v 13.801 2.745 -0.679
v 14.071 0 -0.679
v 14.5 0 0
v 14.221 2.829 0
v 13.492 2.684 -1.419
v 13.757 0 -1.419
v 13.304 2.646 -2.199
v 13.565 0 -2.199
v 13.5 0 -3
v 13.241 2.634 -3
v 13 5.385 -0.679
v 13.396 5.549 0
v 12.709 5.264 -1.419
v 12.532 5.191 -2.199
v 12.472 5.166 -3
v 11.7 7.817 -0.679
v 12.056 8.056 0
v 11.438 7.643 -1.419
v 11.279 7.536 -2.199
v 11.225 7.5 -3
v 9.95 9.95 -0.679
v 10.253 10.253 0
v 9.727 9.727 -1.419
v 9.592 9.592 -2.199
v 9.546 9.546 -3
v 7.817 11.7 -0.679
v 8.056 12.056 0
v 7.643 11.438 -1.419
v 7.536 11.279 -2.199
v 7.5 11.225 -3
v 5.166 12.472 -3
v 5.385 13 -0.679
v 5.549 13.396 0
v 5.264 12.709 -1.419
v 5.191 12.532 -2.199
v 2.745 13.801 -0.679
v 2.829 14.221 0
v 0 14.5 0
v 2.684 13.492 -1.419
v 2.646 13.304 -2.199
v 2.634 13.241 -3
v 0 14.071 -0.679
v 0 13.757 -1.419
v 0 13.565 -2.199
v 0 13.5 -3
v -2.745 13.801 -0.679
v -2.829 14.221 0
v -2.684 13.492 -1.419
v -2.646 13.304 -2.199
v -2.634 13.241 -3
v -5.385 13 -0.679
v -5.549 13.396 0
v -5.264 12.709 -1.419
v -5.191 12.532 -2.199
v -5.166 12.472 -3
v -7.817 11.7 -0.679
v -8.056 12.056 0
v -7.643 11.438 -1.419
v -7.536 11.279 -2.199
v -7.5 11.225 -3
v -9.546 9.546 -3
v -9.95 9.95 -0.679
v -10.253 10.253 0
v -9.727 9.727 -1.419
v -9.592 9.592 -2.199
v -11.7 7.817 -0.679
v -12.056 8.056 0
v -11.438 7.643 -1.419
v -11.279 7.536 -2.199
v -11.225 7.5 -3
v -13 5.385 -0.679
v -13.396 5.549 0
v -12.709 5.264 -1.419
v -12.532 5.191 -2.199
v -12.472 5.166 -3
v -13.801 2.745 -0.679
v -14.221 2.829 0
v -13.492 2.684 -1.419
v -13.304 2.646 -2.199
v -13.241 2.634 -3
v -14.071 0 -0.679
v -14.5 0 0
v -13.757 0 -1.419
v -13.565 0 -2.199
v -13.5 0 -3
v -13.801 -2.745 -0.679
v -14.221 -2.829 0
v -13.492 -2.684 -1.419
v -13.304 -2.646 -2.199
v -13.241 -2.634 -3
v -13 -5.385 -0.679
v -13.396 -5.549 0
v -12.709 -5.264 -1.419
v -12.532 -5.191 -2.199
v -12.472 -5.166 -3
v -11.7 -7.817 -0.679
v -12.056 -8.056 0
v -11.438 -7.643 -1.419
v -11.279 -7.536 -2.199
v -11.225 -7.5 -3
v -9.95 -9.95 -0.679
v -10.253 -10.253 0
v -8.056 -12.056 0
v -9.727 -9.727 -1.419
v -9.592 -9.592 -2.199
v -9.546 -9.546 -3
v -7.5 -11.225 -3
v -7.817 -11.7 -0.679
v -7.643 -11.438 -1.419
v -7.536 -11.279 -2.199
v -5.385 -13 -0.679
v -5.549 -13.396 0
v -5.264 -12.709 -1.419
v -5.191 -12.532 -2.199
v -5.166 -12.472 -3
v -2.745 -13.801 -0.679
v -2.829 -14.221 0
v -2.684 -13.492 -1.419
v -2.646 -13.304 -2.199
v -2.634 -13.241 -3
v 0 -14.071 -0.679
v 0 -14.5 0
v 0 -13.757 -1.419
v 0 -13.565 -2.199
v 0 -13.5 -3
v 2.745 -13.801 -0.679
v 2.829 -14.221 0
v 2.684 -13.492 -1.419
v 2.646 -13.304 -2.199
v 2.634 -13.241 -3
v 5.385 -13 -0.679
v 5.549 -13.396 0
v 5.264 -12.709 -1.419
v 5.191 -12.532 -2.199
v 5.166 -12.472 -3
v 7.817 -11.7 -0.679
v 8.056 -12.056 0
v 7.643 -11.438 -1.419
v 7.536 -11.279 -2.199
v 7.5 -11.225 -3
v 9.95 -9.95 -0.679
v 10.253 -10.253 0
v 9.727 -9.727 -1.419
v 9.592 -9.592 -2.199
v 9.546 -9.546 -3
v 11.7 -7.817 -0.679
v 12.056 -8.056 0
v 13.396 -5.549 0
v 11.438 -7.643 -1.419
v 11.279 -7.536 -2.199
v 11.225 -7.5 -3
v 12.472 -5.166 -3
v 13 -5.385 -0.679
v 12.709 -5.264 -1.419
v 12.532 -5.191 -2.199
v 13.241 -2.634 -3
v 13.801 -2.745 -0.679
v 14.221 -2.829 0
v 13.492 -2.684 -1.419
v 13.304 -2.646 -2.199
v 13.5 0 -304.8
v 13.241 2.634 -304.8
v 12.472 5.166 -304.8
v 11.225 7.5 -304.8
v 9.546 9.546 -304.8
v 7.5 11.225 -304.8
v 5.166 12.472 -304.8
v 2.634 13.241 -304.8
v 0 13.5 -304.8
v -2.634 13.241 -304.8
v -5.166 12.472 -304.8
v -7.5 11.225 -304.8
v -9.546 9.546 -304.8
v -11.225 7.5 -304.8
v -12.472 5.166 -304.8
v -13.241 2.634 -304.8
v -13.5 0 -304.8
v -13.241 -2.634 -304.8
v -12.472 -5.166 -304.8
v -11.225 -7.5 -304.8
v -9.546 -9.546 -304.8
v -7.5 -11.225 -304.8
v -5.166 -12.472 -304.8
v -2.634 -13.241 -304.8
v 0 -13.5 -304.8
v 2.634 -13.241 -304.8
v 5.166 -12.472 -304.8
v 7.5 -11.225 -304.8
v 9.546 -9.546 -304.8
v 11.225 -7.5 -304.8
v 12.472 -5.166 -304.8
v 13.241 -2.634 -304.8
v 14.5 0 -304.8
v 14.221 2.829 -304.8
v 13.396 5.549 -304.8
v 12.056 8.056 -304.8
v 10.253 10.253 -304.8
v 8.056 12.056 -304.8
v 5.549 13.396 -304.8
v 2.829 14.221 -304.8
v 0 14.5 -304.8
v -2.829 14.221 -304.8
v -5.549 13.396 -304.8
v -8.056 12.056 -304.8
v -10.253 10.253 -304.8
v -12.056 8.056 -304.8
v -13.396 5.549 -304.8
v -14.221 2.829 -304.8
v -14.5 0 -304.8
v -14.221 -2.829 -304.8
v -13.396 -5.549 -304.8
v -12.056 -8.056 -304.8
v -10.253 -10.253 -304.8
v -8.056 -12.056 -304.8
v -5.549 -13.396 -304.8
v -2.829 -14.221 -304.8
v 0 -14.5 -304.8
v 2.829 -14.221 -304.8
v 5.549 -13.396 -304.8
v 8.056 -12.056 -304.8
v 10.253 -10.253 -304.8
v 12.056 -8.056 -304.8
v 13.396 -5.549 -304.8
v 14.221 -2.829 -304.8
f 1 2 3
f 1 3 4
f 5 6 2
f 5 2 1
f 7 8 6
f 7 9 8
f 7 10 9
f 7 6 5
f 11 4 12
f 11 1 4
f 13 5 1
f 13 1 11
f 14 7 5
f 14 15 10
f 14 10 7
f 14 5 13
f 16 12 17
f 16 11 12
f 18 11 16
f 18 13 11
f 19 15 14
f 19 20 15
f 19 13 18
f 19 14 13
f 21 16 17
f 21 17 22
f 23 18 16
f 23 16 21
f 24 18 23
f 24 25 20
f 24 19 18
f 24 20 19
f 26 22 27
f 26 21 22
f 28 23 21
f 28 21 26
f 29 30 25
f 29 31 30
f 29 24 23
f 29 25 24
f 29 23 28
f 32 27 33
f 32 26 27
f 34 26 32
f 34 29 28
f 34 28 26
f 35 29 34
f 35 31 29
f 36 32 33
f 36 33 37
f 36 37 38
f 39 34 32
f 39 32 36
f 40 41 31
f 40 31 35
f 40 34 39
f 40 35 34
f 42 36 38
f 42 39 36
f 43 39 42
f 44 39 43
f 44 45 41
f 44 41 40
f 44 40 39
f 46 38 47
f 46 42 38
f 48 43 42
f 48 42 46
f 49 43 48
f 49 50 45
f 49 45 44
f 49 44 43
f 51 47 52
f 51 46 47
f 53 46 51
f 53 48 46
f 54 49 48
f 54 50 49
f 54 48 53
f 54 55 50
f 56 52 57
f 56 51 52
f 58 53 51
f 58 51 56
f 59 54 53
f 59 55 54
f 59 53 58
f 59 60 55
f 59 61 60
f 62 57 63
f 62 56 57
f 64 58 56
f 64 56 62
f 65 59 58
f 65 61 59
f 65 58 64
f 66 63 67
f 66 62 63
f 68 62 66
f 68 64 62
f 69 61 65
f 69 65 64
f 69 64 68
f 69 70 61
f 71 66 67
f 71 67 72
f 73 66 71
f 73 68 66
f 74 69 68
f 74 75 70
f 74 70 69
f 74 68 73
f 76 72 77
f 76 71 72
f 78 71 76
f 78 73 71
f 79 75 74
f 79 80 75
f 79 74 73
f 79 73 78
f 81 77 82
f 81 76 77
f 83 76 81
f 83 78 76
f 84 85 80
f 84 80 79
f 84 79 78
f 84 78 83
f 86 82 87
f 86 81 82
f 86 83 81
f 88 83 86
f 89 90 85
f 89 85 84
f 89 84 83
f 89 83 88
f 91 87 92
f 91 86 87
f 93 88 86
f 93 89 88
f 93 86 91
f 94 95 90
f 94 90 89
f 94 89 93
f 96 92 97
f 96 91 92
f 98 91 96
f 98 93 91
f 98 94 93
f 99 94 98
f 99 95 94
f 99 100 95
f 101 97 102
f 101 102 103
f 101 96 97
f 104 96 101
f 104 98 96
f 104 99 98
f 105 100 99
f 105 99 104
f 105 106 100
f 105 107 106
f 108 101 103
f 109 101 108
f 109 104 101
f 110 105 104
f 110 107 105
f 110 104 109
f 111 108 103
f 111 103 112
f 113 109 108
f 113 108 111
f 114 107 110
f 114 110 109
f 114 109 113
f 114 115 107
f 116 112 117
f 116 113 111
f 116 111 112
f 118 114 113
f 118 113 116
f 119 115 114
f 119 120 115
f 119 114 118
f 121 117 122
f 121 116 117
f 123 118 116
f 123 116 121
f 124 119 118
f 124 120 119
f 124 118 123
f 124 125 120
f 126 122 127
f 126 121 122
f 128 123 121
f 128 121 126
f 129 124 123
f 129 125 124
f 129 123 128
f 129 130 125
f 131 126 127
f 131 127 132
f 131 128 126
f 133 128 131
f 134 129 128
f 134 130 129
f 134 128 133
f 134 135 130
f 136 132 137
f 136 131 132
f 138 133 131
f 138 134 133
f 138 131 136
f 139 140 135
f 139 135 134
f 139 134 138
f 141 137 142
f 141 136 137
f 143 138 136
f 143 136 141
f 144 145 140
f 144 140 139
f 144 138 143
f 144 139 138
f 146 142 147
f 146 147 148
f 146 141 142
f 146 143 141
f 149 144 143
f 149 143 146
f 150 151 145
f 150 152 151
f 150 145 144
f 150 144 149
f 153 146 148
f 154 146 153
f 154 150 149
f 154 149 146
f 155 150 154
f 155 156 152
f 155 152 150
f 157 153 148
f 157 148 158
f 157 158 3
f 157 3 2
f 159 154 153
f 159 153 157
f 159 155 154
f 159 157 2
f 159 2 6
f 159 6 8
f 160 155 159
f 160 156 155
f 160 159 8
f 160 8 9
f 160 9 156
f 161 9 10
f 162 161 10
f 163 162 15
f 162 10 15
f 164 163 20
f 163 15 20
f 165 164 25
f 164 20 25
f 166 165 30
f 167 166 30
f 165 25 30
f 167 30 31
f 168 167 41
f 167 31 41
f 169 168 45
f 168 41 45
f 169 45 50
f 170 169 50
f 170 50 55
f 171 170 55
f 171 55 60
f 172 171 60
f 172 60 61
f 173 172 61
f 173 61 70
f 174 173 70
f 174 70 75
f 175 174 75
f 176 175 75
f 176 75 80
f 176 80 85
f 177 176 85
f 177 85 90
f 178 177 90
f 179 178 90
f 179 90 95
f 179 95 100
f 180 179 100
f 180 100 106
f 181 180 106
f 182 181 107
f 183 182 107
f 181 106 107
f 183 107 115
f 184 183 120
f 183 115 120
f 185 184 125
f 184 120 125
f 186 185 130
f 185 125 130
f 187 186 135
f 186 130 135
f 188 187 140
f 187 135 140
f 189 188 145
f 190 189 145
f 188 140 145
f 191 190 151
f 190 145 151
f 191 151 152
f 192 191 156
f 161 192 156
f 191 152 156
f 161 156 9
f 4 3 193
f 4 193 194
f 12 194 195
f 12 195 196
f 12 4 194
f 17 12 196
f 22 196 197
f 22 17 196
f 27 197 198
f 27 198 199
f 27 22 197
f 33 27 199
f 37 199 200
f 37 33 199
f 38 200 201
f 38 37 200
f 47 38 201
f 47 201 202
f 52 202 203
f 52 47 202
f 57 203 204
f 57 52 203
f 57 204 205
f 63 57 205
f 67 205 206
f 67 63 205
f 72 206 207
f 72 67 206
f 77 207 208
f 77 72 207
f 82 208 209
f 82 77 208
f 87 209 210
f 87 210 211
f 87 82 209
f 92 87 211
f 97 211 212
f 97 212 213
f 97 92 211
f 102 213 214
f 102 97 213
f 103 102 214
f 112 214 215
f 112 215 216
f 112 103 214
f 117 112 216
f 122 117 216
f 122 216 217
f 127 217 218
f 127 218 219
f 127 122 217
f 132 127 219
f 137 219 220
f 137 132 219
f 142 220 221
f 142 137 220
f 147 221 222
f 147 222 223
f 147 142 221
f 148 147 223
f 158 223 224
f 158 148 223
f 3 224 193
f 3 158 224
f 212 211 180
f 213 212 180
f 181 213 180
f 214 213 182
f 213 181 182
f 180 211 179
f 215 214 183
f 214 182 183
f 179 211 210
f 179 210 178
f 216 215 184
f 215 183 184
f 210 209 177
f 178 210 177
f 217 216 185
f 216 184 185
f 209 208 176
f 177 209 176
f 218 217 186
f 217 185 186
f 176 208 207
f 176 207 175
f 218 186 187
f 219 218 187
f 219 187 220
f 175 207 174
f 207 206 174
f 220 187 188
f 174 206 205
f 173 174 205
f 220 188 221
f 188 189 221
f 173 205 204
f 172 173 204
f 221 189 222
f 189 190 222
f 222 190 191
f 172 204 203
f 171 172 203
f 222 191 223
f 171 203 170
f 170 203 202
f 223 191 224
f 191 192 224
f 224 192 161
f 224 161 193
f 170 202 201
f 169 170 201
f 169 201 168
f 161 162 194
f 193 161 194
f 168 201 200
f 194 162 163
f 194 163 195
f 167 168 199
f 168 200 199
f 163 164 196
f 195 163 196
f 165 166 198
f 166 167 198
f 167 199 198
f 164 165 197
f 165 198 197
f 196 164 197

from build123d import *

# Parameters (mm, degrees)
SKETCH1_R           = 14.5
BOSS_EXTRUDE1_DEPTH = 304.8
SKETCH2_R           = 13.5
CUT_EXTRUDE1_DEPTH  = 304.8
FILLET3_R           = 5


with BuildPart() as part:
    # Sketch1 → Boss-Extrude1 (new body)
    with BuildSketch(Plane.XY):
        Circle(SKETCH1_R)
    extrude(amount=-BOSS_EXTRUDE1_DEPTH)

    # Sketch2 → Cut-Extrude1 (cut)
    with BuildSketch(Plane.XY):
        Circle(SKETCH2_R)
    extrude(amount=-CUT_EXTRUDE1_DEPTH, mode=Mode.SUBTRACT)

    # Fillet3
    # the kernel refuses this fillet: 5 mm, written as the material it takes off along each edge
    with BuildSketch(Plane(origin=(0, 0, 0), x_dir=(1, 0, 0), z_dir=(0, -1, 0))) as fillet3_piece_1:
        with BuildLine():
            CenterArc((18.5, -3), FILLET3_R, 143.130102354, 36.869897646)
            Line((13.5, -3), (13.4, -3))
            Line((13.4, -3), (13.4, 0))
            Line((13.4, 0), (13.5, 0.1))
            ThreePointArc((13.5, 0.1), (14, 0.1), (14.42, 0.06))
            Line((14.42, 0.06), (14.5, 0))
        make_face()
    revolve(axis=Axis((0, 0, 0), (0, 0, 1)), mode=Mode.SUBTRACT)


solid = part.part
